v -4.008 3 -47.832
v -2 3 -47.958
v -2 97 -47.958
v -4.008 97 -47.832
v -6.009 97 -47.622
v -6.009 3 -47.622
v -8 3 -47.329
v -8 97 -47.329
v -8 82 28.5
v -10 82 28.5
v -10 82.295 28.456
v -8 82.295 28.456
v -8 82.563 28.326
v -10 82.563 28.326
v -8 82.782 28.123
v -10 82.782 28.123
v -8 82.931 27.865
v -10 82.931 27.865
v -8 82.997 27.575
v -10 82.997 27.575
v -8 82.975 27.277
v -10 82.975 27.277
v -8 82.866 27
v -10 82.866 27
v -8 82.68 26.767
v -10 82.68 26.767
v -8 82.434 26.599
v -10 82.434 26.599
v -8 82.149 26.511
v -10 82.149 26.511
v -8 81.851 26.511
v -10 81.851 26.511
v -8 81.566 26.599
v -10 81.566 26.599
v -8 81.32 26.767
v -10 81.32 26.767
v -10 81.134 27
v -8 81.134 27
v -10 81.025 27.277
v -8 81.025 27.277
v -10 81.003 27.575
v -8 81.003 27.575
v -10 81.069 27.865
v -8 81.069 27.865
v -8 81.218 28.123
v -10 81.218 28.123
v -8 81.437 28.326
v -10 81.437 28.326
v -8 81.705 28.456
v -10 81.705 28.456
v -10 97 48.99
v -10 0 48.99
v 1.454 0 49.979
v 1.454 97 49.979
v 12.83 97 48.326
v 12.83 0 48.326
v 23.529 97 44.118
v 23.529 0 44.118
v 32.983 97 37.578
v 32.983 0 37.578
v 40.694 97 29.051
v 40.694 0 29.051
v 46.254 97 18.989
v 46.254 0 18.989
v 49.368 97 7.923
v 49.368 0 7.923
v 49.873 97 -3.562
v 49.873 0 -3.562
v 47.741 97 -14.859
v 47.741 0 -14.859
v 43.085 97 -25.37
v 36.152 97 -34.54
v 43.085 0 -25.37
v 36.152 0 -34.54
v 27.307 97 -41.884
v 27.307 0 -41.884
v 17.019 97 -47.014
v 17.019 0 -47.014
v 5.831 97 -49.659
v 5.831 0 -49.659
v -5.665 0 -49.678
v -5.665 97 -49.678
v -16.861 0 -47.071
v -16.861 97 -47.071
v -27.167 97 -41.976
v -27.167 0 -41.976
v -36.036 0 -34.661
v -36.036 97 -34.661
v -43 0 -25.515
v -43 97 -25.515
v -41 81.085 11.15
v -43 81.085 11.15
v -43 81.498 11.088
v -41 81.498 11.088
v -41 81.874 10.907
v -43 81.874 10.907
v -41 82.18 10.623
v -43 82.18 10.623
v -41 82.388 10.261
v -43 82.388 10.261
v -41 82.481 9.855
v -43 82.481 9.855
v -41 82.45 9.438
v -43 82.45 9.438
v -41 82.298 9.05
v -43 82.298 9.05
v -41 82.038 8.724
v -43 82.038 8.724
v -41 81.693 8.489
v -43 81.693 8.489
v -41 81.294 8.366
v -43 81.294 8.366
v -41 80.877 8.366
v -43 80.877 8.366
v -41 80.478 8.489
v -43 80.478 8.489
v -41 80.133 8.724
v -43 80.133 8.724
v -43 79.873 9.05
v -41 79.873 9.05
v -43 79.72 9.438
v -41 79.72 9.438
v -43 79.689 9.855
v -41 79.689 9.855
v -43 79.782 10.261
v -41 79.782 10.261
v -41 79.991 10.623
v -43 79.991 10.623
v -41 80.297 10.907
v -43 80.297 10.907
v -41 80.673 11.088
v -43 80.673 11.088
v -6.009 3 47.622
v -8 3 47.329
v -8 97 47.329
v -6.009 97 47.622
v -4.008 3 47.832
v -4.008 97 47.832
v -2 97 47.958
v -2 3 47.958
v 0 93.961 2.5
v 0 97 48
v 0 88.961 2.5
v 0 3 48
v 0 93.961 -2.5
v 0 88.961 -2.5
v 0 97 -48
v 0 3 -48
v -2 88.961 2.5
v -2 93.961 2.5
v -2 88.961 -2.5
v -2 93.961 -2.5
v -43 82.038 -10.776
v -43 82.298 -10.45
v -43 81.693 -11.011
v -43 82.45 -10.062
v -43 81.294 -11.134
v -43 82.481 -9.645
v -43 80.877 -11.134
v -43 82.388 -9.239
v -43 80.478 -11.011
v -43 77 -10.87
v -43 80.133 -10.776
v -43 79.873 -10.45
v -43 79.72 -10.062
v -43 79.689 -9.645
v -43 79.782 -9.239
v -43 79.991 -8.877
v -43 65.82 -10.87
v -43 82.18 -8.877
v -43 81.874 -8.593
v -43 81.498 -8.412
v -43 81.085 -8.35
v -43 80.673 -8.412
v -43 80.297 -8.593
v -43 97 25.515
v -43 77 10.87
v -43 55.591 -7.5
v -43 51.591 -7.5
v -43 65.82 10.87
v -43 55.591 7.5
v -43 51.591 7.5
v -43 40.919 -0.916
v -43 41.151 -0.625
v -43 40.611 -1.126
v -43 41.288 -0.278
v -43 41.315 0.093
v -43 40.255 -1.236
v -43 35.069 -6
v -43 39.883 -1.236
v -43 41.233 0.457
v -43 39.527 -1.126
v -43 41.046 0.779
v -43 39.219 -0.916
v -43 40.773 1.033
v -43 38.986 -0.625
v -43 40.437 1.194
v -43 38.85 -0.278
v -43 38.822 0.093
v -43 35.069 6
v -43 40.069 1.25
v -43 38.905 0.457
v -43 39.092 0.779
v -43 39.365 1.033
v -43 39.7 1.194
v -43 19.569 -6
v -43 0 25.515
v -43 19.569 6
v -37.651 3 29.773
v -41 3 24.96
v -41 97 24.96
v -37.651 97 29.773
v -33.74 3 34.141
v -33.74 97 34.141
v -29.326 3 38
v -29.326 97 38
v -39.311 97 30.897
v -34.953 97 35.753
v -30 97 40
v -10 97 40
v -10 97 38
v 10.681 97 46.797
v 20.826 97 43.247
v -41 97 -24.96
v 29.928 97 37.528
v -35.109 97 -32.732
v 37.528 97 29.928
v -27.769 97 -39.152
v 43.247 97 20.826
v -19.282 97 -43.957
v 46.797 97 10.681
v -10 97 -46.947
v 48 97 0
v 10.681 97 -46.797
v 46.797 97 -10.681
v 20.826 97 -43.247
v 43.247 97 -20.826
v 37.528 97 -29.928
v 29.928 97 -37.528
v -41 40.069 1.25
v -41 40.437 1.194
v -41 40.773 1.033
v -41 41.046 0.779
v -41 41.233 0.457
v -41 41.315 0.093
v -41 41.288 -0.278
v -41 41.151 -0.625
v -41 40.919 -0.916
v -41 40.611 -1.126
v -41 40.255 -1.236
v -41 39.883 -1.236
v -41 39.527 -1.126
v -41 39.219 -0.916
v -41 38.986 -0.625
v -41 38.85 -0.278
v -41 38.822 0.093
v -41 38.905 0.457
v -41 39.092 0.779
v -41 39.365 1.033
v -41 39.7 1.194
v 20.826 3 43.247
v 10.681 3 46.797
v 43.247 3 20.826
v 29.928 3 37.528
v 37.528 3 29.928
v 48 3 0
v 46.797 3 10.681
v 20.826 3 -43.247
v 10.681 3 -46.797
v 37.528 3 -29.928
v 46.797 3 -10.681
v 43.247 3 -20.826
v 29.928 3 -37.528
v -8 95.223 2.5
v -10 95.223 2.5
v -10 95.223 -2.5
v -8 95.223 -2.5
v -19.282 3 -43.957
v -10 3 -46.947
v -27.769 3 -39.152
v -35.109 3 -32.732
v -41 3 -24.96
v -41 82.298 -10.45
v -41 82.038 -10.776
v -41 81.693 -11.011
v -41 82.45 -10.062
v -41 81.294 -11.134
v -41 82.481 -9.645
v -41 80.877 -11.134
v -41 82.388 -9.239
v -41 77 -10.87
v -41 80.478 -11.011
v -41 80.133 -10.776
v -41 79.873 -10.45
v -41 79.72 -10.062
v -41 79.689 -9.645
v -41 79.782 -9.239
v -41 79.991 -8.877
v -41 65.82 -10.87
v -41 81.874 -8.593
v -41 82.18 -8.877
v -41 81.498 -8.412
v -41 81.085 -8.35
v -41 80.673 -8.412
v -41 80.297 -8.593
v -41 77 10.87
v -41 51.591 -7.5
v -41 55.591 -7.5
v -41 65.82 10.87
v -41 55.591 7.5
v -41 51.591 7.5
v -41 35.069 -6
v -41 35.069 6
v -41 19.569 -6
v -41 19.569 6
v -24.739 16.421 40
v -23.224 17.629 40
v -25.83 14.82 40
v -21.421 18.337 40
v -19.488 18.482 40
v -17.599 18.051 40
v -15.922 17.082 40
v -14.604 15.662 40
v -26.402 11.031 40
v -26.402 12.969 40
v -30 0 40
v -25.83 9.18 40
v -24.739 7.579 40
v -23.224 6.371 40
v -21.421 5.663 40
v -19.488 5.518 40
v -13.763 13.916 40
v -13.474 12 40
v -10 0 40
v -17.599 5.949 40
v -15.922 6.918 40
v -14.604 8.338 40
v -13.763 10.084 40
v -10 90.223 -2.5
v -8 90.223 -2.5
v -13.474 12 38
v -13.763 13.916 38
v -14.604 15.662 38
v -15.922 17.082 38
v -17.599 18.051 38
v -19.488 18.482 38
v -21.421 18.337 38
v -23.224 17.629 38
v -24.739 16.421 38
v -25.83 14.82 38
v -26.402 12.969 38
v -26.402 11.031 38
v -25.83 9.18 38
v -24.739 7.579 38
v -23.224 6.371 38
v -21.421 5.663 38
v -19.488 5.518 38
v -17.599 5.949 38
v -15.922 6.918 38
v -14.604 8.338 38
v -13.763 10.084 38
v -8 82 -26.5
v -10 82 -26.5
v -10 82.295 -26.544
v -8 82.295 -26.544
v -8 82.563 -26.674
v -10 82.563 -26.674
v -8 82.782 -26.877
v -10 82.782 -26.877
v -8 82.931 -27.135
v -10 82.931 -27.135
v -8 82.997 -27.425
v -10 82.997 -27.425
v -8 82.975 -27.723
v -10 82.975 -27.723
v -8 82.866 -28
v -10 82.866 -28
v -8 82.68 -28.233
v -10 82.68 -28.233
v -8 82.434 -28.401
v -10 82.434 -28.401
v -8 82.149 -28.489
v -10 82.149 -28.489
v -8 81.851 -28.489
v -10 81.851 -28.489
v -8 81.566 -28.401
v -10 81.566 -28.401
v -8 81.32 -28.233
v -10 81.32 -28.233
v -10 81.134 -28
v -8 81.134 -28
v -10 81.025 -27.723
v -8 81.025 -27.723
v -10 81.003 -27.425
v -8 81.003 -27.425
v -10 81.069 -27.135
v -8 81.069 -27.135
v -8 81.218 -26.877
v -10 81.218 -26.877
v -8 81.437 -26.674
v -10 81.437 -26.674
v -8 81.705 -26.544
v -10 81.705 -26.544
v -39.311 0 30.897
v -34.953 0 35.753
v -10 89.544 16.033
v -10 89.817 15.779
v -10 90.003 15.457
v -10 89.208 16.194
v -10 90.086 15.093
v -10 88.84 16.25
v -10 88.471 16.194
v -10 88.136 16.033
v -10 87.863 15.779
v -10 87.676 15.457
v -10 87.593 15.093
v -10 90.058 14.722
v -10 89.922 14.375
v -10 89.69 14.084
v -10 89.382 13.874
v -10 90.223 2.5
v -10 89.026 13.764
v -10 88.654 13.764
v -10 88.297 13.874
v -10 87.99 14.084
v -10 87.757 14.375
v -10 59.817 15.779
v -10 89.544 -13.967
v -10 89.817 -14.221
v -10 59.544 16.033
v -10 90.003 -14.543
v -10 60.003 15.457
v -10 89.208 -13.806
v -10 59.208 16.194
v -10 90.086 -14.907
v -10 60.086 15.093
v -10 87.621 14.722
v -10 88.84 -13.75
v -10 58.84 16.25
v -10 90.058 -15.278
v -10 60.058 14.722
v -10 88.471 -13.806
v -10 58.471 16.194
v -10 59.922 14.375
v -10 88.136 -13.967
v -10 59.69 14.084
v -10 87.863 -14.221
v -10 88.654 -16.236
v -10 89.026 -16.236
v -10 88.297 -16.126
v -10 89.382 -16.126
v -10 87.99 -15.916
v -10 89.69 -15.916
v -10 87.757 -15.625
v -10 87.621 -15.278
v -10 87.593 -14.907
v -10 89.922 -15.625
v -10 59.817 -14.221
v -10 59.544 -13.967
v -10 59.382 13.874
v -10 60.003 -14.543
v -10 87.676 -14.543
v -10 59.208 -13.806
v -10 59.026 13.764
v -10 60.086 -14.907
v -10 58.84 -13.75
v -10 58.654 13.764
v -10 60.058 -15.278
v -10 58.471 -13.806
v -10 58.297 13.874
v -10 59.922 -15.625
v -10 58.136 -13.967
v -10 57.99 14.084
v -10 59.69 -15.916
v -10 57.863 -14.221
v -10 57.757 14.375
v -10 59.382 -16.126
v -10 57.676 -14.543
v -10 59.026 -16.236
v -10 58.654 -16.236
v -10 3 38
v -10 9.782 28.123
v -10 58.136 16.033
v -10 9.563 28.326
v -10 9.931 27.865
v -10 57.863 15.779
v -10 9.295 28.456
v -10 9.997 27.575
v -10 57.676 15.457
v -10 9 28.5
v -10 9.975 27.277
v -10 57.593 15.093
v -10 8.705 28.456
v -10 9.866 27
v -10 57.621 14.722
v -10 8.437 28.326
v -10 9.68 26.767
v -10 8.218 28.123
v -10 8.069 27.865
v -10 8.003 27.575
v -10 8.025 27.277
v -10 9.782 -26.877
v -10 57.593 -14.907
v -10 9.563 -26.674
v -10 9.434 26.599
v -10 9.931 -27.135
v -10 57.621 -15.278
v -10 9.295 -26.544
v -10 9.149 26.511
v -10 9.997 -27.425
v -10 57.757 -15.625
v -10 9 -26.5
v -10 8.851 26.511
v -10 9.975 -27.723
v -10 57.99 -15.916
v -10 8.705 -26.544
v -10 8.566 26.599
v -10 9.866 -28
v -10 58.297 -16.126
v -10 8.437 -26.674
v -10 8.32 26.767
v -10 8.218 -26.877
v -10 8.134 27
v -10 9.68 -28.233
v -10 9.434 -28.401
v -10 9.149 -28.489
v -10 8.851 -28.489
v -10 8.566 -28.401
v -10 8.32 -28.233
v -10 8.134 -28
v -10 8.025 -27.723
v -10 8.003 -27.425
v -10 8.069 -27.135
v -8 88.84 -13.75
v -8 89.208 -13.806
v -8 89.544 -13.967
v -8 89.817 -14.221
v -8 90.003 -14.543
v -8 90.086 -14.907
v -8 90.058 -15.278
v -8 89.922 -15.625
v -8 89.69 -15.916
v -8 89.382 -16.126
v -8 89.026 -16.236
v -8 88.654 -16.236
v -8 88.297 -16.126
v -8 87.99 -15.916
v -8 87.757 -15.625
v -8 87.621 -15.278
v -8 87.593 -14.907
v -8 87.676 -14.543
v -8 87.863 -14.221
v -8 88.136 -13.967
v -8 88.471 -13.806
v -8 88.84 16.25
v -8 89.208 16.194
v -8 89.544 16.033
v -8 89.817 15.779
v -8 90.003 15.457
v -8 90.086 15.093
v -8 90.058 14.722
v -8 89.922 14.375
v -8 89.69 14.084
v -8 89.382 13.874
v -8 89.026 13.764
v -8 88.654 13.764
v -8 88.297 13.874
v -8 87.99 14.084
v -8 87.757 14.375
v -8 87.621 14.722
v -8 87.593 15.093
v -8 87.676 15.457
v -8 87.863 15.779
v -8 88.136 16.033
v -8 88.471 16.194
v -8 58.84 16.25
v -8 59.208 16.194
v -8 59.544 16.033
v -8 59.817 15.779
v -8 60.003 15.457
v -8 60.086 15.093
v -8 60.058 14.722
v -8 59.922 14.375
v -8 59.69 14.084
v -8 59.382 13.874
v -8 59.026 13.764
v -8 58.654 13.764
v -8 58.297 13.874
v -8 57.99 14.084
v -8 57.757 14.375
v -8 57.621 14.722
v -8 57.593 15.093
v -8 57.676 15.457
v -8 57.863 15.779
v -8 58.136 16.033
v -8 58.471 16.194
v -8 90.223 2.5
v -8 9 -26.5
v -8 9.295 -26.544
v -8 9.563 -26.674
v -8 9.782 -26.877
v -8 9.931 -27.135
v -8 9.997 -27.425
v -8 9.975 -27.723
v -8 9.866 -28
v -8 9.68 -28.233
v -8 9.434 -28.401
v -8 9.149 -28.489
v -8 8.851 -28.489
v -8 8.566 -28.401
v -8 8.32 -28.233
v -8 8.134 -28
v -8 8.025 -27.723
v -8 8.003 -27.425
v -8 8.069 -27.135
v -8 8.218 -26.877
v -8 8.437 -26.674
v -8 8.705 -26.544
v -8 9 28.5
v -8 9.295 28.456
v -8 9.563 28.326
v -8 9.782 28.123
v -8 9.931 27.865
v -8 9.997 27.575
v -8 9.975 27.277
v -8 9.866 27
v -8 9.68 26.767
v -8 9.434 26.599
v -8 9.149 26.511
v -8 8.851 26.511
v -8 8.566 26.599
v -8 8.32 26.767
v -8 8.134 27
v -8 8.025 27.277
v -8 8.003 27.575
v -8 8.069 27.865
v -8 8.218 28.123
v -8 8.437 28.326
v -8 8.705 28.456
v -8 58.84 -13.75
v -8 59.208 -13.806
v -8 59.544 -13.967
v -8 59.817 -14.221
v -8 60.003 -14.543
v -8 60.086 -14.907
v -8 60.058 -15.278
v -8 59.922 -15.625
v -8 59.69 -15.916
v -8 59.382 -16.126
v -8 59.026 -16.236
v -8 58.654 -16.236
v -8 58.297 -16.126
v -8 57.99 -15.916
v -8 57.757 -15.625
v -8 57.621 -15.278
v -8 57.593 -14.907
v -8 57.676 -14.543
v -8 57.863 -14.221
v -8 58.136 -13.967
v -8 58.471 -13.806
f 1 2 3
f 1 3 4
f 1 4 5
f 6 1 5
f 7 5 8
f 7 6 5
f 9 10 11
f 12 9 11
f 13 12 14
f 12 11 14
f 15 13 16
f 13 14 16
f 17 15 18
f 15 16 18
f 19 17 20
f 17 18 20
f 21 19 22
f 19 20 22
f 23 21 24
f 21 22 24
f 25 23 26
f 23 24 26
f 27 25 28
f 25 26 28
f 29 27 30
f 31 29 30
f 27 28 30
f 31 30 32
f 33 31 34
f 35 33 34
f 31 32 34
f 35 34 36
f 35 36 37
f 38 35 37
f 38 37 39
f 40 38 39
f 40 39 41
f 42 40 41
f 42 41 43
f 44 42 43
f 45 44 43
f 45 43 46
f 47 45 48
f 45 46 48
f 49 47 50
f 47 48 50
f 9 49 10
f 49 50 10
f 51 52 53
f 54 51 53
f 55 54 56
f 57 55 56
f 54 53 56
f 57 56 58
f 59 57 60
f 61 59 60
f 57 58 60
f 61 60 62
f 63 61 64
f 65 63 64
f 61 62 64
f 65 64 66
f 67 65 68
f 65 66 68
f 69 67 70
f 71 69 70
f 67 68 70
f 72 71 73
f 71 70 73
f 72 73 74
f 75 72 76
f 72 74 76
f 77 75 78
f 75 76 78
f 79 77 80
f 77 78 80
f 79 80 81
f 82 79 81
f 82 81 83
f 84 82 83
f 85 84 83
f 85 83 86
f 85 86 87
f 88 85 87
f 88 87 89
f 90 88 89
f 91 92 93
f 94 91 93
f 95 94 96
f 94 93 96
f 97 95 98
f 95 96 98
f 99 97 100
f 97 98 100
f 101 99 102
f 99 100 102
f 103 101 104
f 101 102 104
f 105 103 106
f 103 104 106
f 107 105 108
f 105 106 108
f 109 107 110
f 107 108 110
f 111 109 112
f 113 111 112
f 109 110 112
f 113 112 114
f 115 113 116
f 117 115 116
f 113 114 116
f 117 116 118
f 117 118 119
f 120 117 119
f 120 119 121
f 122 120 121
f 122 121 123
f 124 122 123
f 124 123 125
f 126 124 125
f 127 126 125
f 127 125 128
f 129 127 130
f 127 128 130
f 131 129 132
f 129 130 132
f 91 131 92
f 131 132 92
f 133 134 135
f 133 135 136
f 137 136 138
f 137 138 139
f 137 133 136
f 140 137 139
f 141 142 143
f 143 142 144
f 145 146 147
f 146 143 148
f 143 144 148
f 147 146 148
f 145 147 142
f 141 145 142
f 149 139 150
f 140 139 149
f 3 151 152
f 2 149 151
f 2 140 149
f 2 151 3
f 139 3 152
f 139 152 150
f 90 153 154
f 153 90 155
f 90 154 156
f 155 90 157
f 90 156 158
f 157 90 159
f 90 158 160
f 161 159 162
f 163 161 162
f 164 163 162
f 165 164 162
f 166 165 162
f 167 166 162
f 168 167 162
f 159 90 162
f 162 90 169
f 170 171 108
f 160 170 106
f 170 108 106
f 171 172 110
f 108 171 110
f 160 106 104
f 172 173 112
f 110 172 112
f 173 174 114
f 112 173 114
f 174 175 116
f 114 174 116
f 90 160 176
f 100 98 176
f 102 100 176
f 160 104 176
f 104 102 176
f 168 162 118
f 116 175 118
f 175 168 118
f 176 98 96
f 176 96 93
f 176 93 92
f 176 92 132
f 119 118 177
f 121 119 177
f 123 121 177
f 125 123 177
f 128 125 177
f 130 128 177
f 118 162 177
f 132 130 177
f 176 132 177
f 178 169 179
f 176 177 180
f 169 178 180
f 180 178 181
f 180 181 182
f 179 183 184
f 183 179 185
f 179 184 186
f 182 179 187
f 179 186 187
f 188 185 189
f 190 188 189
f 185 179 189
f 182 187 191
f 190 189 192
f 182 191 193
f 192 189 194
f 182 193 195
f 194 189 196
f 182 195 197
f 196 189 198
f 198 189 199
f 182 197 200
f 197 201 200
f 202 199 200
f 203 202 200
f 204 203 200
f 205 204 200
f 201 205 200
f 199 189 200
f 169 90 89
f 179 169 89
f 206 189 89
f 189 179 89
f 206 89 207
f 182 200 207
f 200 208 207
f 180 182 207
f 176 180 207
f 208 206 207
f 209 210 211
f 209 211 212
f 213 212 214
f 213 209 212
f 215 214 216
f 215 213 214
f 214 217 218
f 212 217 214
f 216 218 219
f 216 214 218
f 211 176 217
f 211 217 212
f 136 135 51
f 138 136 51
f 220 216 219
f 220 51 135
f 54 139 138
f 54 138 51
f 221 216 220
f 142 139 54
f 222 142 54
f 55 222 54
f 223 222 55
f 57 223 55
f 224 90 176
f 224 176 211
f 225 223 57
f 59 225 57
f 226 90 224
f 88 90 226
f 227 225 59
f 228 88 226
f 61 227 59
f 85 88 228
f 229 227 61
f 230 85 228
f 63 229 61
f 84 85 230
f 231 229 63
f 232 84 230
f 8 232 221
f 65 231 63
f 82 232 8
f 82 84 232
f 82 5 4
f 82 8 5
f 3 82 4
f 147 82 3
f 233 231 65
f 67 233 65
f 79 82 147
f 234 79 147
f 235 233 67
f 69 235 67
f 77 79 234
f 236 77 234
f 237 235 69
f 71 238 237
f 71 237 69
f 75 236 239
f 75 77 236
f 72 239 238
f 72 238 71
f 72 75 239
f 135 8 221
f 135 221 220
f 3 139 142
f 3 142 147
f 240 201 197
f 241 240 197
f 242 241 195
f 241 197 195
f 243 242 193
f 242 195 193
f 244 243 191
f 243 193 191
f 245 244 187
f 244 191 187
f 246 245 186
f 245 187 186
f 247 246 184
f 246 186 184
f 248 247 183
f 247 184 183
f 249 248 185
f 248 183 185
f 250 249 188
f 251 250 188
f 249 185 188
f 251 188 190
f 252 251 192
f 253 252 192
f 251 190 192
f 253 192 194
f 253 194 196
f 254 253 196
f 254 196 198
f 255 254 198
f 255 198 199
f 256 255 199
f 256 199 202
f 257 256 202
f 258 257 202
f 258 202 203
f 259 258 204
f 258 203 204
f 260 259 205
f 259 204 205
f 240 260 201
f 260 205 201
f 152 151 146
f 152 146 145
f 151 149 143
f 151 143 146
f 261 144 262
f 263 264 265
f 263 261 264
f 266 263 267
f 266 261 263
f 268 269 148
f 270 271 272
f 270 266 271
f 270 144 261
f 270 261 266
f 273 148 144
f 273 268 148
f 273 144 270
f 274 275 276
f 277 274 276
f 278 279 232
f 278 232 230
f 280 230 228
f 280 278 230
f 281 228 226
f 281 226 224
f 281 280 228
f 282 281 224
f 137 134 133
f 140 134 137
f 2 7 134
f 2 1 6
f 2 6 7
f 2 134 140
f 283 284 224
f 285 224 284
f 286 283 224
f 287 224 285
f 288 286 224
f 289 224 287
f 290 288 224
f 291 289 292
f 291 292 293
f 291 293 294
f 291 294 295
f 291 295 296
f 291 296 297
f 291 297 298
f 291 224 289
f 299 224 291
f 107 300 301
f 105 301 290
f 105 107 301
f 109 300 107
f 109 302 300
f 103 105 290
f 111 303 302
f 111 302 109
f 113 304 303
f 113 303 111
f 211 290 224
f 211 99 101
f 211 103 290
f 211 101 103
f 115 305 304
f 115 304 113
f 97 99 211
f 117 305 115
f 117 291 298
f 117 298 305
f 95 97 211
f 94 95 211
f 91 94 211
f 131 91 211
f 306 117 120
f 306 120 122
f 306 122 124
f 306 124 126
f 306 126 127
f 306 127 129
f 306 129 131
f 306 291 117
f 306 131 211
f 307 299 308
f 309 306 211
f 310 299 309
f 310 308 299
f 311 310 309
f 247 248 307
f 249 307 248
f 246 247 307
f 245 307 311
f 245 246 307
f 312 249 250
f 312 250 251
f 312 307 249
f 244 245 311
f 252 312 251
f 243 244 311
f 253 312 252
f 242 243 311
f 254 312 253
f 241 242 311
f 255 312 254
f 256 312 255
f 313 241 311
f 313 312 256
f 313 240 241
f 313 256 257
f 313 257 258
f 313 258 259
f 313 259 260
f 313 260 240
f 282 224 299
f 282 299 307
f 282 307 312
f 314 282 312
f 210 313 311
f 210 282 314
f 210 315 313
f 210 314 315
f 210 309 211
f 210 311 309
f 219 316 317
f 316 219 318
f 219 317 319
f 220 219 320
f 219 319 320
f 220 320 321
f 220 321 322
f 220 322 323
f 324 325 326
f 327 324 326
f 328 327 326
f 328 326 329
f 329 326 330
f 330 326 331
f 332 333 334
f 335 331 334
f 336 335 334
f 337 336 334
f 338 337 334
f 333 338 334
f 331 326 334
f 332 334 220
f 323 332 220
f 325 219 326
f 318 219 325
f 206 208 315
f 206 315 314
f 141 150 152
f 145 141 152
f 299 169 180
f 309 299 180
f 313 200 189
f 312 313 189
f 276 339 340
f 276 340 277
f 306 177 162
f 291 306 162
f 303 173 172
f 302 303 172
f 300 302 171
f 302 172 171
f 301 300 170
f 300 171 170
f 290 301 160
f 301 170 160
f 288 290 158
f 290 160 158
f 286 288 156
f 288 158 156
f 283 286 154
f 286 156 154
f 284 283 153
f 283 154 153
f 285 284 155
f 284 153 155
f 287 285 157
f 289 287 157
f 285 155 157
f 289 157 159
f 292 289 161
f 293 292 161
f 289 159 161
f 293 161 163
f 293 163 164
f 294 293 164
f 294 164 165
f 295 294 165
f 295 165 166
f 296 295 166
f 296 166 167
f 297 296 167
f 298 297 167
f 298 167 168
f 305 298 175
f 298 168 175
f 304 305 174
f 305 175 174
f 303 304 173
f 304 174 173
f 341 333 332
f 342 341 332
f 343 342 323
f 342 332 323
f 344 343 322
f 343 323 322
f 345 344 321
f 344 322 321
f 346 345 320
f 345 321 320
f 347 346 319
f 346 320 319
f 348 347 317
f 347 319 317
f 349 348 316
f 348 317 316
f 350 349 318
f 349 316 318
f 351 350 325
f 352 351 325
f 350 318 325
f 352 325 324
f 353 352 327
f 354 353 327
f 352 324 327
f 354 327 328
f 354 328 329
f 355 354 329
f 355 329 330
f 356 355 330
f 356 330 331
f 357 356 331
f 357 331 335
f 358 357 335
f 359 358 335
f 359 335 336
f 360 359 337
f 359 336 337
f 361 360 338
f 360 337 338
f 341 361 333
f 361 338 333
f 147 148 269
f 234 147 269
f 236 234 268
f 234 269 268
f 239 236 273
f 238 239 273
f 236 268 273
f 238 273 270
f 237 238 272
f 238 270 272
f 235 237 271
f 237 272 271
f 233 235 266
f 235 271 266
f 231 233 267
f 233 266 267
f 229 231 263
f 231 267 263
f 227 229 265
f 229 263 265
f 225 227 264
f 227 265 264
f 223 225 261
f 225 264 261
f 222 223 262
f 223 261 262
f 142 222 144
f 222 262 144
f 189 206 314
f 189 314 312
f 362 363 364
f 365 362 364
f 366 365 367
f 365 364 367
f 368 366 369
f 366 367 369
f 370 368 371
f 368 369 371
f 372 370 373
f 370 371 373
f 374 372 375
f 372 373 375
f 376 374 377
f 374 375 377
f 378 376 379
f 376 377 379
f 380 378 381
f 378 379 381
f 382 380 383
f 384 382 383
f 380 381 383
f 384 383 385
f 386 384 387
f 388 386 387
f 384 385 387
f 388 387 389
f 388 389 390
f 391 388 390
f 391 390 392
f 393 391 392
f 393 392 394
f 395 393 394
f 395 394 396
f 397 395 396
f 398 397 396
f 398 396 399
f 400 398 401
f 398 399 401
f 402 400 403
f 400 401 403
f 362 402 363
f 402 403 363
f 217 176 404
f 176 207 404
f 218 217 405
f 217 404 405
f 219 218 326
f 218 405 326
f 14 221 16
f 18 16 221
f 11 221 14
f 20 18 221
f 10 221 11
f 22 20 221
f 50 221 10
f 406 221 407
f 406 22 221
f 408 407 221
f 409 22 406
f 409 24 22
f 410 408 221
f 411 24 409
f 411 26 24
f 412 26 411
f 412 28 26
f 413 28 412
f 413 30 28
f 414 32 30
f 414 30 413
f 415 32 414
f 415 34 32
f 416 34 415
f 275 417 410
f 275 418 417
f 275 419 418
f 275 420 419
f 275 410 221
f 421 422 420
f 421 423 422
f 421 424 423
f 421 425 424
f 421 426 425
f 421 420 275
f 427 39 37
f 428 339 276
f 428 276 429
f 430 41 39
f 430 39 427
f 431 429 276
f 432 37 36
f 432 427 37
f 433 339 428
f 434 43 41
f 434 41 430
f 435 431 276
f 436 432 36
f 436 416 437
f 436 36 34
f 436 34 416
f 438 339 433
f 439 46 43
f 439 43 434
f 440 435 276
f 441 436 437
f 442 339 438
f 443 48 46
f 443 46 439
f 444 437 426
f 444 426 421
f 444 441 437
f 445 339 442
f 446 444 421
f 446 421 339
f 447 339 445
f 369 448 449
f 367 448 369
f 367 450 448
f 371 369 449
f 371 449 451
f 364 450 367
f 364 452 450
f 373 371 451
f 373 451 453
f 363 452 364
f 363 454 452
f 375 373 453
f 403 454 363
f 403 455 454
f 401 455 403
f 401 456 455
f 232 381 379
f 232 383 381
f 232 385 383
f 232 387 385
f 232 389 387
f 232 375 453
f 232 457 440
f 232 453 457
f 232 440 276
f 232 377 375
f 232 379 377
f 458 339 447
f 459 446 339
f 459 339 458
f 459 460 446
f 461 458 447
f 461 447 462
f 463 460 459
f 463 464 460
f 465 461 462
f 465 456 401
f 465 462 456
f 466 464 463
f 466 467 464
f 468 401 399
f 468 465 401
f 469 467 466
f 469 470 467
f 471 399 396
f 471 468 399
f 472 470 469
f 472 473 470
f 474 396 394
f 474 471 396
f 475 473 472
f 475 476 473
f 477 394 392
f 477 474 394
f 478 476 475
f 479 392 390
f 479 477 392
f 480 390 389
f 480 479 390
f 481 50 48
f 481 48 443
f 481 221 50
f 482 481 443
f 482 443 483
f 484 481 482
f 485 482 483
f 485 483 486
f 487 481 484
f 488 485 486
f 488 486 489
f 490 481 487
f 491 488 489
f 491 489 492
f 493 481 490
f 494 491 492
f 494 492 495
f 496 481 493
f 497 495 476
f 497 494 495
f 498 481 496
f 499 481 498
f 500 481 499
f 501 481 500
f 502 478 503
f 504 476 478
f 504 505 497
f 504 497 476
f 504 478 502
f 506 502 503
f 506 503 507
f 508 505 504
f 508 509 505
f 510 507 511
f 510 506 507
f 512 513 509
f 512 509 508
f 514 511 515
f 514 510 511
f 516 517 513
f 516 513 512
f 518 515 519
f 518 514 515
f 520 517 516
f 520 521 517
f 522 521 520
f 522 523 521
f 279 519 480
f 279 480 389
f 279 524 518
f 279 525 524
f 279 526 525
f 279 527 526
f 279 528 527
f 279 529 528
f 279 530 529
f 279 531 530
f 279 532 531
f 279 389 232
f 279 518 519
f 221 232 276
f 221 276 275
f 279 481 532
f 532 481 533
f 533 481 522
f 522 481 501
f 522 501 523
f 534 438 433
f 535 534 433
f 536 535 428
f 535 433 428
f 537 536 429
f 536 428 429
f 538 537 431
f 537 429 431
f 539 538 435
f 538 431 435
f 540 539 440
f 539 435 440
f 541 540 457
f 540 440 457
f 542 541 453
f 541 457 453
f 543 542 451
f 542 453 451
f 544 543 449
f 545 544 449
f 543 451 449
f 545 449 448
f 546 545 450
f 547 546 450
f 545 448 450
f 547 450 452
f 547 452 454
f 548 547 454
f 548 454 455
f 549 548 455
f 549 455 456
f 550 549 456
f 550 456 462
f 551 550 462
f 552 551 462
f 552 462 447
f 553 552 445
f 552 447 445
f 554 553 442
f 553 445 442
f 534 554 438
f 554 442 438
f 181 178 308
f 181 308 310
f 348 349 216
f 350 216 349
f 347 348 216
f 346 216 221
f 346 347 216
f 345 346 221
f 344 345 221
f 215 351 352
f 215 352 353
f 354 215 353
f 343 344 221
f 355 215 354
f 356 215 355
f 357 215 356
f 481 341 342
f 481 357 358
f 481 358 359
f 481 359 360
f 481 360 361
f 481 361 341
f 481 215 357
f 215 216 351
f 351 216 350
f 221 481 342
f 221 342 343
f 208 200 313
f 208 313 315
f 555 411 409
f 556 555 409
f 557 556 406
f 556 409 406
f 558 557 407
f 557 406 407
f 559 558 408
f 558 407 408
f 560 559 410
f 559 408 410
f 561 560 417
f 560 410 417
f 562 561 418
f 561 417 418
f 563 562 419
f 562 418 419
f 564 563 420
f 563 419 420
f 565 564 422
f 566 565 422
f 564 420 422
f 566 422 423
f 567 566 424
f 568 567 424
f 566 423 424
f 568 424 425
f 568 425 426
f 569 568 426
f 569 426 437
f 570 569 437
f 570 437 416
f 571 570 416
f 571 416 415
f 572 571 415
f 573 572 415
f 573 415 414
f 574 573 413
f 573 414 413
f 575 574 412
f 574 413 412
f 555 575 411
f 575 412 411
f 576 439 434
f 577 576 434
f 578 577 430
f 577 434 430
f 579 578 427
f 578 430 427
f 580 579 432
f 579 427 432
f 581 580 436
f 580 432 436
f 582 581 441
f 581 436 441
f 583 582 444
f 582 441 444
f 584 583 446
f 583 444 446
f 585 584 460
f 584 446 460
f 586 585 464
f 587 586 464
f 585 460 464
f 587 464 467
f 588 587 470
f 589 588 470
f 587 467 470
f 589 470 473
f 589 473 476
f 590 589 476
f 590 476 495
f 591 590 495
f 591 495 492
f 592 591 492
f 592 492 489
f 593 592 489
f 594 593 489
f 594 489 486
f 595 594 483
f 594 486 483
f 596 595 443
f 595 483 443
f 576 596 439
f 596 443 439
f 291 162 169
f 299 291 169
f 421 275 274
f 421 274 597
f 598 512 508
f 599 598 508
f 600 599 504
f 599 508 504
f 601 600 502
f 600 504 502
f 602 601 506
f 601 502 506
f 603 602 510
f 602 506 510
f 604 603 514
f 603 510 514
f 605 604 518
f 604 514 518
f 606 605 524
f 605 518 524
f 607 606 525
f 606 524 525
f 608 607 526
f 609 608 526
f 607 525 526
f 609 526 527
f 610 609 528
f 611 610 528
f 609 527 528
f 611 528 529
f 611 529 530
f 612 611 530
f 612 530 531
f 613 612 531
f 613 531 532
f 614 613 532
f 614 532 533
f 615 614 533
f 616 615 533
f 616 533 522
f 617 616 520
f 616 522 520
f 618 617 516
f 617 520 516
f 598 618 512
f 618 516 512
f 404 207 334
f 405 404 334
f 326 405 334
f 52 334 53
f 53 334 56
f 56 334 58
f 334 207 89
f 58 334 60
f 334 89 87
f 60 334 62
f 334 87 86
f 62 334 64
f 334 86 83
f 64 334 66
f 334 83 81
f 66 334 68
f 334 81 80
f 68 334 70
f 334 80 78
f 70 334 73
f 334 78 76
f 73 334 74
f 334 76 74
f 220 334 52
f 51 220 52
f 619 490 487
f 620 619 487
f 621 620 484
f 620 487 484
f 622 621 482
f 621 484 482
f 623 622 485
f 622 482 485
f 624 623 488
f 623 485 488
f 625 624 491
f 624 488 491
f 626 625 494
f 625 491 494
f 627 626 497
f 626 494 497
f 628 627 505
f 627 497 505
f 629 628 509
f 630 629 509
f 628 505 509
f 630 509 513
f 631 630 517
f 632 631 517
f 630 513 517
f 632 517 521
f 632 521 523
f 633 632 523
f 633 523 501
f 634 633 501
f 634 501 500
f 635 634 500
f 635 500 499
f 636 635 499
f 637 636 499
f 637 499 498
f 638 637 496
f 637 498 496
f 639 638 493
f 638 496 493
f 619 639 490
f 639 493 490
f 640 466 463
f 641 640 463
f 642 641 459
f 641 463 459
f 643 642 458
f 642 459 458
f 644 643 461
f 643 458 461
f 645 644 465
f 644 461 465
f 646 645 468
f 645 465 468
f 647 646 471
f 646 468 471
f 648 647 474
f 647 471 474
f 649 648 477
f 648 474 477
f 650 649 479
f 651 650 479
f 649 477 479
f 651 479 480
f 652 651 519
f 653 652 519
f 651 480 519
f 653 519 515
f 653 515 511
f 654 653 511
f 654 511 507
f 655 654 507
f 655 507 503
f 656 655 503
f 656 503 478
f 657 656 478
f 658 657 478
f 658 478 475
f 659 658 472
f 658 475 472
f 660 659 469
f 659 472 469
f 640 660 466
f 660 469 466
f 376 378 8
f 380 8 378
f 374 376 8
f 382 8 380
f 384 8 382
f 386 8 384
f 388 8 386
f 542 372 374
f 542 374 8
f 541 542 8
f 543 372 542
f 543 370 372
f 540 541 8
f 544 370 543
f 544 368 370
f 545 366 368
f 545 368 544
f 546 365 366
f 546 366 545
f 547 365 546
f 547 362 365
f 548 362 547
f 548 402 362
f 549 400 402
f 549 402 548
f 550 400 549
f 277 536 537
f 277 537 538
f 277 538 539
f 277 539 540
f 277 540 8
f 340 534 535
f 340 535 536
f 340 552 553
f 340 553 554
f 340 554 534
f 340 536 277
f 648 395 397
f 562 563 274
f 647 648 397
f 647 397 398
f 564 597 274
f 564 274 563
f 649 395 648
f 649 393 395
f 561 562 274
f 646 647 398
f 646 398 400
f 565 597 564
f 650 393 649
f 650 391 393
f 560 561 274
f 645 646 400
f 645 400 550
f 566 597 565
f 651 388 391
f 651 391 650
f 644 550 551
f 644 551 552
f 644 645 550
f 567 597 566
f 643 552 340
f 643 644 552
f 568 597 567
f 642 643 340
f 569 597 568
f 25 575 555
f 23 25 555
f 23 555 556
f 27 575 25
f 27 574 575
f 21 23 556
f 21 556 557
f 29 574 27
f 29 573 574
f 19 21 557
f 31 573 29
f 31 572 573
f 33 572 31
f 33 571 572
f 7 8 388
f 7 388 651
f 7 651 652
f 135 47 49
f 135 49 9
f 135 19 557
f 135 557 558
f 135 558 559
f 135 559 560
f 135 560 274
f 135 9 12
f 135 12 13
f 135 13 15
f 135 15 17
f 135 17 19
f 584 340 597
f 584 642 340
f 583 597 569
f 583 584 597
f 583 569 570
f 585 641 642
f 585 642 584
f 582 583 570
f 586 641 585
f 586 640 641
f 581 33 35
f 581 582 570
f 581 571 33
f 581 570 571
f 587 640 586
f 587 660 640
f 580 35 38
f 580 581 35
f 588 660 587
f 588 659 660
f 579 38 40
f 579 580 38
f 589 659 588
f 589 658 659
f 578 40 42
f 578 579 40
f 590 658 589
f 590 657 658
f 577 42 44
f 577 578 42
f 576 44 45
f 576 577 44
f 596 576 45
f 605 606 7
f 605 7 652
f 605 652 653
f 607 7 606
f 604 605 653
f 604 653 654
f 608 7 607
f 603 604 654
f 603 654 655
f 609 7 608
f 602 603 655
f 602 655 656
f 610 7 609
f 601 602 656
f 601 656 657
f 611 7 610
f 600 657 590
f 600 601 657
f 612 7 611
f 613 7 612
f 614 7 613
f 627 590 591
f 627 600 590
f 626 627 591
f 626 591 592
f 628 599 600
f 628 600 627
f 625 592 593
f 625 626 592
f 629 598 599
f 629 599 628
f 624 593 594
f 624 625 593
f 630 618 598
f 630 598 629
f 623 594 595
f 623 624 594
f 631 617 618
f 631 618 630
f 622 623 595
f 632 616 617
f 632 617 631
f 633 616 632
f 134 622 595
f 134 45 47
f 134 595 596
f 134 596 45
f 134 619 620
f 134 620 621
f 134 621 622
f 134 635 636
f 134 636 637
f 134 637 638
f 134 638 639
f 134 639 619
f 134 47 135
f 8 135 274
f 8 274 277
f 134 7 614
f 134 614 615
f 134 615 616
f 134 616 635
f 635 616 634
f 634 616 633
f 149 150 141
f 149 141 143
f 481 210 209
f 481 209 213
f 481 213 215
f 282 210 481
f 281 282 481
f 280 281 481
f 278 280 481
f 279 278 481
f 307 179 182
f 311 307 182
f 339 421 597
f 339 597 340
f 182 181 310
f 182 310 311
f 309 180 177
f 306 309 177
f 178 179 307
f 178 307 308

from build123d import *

# Parameters (mm, degrees)
BOSS_EXTRUDE1_DEPTH = 3
BOSS_EXTRUDE2_DEPTH = 94
SKETCH4_R           = 1.4
SKETCH4_R_2         = 1.25
CUT_EXTRUDE1_DEPTH  = 2
SKETCH5_R           = 6.5
CUT_EXTRUDE2_DEPTH  = 2
SKETCH6_R           = 1
SKETCH6_R_2         = 1.25
CUT_EXTRUDE3_DEPTH  = 2
CUT_EXTRUDE4_DEPTH  = 2


with BuildPart() as part:
    # Sketch2 → Boss-Extrude1 (new body)
    with BuildSketch(Plane(origin=(0, 0, 0), x_dir=(1, 0, 0), z_dir=(0, 1, 0))):
        with BuildLine():
            Line((-43, 25.514701644), (-43, -25.514701644))
            ThreePointArc((-43, -25.514701644), (-37.211637523, -33.396018219), (-30, -40))
            Line((-30, -40), (-10, -40))
            Line((-10, -40), (-10, -48.989794856))
            ThreePointArc((-10, -48.989794856), (45.716299059, 20.248950598), (-43, 25.514701644))
        make_face()
    extrude(amount=BOSS_EXTRUDE1_DEPTH)

    # Sketch3 → Boss-Extrude2 (add)
    with BuildSketch(Plane(origin=(0, 3, 0), x_dir=(1, 0, 0), z_dir=(0, 1, 0))):
        with BuildLine():
            Line((-43, 25.514701644), (-43, -25.514701644))
            ThreePointArc((-43, -25.514701644), (-37.211637523, -33.396018219), (-30, -40))
            Line((-30, -40), (-10, -40))
            Line((-10, -40), (-10, -48.989794856))
            ThreePointArc((-10, -48.989794856), (45.716299059, 20.248950598), (-43, 25.514701644))
        make_face()
        with BuildLine():
            Line((-41, 24.959967949), (-41, -24.959967949))
            ThreePointArc((-41, -24.959967949), (-35.762251316, -32.01657978), (-29.325756597, -38))
            Line((-29.325756597, -38), (-10, -38))
            Line((-10, -38), (-10, 46.946778377))
            ThreePointArc((-10, 46.946778377), (-27.768776678, 39.152203537), (-41, 24.959967949))
        make_face(mode=Mode.SUBTRACT)
        with BuildLine():
            Line((-8, -38), (-8, -47.328638265))
            ThreePointArc((-8, -47.328638265), (-5.009902521, -47.737834856), (-2, -47.958315233))
            Line((-2, -47.958315233), (-2, 47.958315233))
            ThreePointArc((-2, 47.958315233), (-5.009902521, 47.737834856), (-8, 47.328638265))
            Line((-8, 47.328638265), (-8, -38))
        make_face(mode=Mode.SUBTRACT)
        with BuildLine():
            Line((0, 0), (0, 48))
            ThreePointArc((0, 48), (48, 0), (0, -48))
            Line((0, -48), (0, 0))
        make_face(mode=Mode.SUBTRACT)
    extrude(amount=BOSS_EXTRUDE2_DEPTH)

    # Sketch4 → Cut-Extrude1 (cut)
    with BuildSketch(Plane.ZY.offset(43)):
        with Locations((-9.75, 81.085264892)):
            Circle(SKETCH4_R)
        with Locations((9.75, 81.085264892)):
            Circle(SKETCH4_R)
        with Locations((0, 40.068908633)):
            Circle(SKETCH4_R_2)
        Polygon((0, 65.82), (10.87, 65.82), (10.87, 77), (-10.87, 77), (-10.87, 65.82), align=None)
        Polygon((-7.5, 55.590703336), (7.5, 55.590703336), (7.5, 51.590703336), (0, 51.590703336), (-7.5, 51.590703336), align=None)
        Polygon((0, 35.068908633), (6, 35.068908633), (6, 19.568908633), (-6, 19.568908633), (-6, 35.068908633), align=None)
    extrude(amount=-CUT_EXTRUDE1_DEPTH, mode=Mode.SUBTRACT)

    # Sketch5 → Cut-Extrude2 (cut)
    with BuildSketch(Plane.XY.offset(40)):
        with Locations((-19.974192729, 12)):
            Circle(SKETCH5_R)
    extrude(amount=-CUT_EXTRUDE2_DEPTH, mode=Mode.SUBTRACT)

    # Sketch6 → Cut-Extrude3 (cut)
    with BuildSketch(Plane.ZY.offset(10)):
        with Locations((-27.5, 82)):
            Circle(SKETCH6_R)
        with Locations((27.5, 82)):
            Circle(SKETCH6_R)
        with Locations((27.5, 9)):
            Circle(SKETCH6_R)
        with Locations((-27.5, 9)):
            Circle(SKETCH6_R)
        with Locations((-15, 88.839838551)):
            Circle(SKETCH6_R_2)
        with Locations((15, 88.839838551)):
            Circle(SKETCH6_R_2)
        with Locations((15, 58.839838551)):
            Circle(SKETCH6_R_2)
        with Locations((-15, 58.839838551)):
            Circle(SKETCH6_R_2)
        Polygon((-2.5, 95.222950519), (0, 95.222950519), (2.5, 95.222950519), (2.5, 90.222950519), (-2.5, 90.222950519), align=None)
    extrude(amount=-CUT_EXTRUDE3_DEPTH, mode=Mode.SUBTRACT)

    # Sketch7 → Cut-Extrude4 (cut)
    with BuildSketch(Plane.ZY.offset(2)):
        Polygon((-2.5, 93.960891169), (0, 93.960891169), (2.5, 93.960891169), (2.5, 88.960891169), (-2.5, 88.960891169), align=None)
    extrude(amount=-CUT_EXTRUDE4_DEPTH, mode=Mode.SUBTRACT)


solid = part.part
